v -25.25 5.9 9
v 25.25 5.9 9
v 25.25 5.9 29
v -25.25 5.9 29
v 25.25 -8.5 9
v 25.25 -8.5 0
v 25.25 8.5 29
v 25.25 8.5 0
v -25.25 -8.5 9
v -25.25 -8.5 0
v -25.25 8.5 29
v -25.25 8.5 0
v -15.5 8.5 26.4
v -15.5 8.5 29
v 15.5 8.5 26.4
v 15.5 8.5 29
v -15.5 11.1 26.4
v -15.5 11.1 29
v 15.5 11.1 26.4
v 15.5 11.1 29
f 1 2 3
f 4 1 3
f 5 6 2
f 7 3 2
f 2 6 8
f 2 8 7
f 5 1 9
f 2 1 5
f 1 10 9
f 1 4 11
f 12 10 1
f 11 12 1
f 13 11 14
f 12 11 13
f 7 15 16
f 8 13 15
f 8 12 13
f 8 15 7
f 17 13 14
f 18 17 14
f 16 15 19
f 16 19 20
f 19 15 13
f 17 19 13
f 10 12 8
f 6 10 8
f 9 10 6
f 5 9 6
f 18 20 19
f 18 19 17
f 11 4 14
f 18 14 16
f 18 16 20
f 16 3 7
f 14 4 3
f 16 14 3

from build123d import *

# Parameters (mm, degrees)
SKETCH_W     = 50.5
SKETCH_H     = 17
PAD_DEPTH    = 9
SKETCH001_W  = 2.6
SKETCH001_H  = 29
PAD001_DEPTH = 25.25
SKETCH002_W  = 31
SKETCH002_H  = 2.6
PAD002_DEPTH = 2.6


with BuildPart() as part:
    # Sketch → Pad (new body)
    with BuildSketch(Plane.XY):
        Rectangle(SKETCH_W, SKETCH_H)
    extrude(amount=PAD_DEPTH)

    # Sketch001 → Pad001 (join, symmetric)
    with BuildSketch(Plane.YZ):
        with Locations((7.2, 14.5)):
            Rectangle(SKETCH001_W, SKETCH001_H)
    extrude(amount=PAD001_DEPTH, both=True)

    # Sketch002 (on Face5 of Pad001) → Pad002 (join)
    with BuildSketch(Plane(origin=(0, 8.5, 0), x_dir=(-1, 0, 0), z_dir=(0, 1, 0))):
        with Locations((0, 27.7)):
            Rectangle(SKETCH002_W, SKETCH002_H)
    extrude(amount=PAD002_DEPTH)


solid = part.part
